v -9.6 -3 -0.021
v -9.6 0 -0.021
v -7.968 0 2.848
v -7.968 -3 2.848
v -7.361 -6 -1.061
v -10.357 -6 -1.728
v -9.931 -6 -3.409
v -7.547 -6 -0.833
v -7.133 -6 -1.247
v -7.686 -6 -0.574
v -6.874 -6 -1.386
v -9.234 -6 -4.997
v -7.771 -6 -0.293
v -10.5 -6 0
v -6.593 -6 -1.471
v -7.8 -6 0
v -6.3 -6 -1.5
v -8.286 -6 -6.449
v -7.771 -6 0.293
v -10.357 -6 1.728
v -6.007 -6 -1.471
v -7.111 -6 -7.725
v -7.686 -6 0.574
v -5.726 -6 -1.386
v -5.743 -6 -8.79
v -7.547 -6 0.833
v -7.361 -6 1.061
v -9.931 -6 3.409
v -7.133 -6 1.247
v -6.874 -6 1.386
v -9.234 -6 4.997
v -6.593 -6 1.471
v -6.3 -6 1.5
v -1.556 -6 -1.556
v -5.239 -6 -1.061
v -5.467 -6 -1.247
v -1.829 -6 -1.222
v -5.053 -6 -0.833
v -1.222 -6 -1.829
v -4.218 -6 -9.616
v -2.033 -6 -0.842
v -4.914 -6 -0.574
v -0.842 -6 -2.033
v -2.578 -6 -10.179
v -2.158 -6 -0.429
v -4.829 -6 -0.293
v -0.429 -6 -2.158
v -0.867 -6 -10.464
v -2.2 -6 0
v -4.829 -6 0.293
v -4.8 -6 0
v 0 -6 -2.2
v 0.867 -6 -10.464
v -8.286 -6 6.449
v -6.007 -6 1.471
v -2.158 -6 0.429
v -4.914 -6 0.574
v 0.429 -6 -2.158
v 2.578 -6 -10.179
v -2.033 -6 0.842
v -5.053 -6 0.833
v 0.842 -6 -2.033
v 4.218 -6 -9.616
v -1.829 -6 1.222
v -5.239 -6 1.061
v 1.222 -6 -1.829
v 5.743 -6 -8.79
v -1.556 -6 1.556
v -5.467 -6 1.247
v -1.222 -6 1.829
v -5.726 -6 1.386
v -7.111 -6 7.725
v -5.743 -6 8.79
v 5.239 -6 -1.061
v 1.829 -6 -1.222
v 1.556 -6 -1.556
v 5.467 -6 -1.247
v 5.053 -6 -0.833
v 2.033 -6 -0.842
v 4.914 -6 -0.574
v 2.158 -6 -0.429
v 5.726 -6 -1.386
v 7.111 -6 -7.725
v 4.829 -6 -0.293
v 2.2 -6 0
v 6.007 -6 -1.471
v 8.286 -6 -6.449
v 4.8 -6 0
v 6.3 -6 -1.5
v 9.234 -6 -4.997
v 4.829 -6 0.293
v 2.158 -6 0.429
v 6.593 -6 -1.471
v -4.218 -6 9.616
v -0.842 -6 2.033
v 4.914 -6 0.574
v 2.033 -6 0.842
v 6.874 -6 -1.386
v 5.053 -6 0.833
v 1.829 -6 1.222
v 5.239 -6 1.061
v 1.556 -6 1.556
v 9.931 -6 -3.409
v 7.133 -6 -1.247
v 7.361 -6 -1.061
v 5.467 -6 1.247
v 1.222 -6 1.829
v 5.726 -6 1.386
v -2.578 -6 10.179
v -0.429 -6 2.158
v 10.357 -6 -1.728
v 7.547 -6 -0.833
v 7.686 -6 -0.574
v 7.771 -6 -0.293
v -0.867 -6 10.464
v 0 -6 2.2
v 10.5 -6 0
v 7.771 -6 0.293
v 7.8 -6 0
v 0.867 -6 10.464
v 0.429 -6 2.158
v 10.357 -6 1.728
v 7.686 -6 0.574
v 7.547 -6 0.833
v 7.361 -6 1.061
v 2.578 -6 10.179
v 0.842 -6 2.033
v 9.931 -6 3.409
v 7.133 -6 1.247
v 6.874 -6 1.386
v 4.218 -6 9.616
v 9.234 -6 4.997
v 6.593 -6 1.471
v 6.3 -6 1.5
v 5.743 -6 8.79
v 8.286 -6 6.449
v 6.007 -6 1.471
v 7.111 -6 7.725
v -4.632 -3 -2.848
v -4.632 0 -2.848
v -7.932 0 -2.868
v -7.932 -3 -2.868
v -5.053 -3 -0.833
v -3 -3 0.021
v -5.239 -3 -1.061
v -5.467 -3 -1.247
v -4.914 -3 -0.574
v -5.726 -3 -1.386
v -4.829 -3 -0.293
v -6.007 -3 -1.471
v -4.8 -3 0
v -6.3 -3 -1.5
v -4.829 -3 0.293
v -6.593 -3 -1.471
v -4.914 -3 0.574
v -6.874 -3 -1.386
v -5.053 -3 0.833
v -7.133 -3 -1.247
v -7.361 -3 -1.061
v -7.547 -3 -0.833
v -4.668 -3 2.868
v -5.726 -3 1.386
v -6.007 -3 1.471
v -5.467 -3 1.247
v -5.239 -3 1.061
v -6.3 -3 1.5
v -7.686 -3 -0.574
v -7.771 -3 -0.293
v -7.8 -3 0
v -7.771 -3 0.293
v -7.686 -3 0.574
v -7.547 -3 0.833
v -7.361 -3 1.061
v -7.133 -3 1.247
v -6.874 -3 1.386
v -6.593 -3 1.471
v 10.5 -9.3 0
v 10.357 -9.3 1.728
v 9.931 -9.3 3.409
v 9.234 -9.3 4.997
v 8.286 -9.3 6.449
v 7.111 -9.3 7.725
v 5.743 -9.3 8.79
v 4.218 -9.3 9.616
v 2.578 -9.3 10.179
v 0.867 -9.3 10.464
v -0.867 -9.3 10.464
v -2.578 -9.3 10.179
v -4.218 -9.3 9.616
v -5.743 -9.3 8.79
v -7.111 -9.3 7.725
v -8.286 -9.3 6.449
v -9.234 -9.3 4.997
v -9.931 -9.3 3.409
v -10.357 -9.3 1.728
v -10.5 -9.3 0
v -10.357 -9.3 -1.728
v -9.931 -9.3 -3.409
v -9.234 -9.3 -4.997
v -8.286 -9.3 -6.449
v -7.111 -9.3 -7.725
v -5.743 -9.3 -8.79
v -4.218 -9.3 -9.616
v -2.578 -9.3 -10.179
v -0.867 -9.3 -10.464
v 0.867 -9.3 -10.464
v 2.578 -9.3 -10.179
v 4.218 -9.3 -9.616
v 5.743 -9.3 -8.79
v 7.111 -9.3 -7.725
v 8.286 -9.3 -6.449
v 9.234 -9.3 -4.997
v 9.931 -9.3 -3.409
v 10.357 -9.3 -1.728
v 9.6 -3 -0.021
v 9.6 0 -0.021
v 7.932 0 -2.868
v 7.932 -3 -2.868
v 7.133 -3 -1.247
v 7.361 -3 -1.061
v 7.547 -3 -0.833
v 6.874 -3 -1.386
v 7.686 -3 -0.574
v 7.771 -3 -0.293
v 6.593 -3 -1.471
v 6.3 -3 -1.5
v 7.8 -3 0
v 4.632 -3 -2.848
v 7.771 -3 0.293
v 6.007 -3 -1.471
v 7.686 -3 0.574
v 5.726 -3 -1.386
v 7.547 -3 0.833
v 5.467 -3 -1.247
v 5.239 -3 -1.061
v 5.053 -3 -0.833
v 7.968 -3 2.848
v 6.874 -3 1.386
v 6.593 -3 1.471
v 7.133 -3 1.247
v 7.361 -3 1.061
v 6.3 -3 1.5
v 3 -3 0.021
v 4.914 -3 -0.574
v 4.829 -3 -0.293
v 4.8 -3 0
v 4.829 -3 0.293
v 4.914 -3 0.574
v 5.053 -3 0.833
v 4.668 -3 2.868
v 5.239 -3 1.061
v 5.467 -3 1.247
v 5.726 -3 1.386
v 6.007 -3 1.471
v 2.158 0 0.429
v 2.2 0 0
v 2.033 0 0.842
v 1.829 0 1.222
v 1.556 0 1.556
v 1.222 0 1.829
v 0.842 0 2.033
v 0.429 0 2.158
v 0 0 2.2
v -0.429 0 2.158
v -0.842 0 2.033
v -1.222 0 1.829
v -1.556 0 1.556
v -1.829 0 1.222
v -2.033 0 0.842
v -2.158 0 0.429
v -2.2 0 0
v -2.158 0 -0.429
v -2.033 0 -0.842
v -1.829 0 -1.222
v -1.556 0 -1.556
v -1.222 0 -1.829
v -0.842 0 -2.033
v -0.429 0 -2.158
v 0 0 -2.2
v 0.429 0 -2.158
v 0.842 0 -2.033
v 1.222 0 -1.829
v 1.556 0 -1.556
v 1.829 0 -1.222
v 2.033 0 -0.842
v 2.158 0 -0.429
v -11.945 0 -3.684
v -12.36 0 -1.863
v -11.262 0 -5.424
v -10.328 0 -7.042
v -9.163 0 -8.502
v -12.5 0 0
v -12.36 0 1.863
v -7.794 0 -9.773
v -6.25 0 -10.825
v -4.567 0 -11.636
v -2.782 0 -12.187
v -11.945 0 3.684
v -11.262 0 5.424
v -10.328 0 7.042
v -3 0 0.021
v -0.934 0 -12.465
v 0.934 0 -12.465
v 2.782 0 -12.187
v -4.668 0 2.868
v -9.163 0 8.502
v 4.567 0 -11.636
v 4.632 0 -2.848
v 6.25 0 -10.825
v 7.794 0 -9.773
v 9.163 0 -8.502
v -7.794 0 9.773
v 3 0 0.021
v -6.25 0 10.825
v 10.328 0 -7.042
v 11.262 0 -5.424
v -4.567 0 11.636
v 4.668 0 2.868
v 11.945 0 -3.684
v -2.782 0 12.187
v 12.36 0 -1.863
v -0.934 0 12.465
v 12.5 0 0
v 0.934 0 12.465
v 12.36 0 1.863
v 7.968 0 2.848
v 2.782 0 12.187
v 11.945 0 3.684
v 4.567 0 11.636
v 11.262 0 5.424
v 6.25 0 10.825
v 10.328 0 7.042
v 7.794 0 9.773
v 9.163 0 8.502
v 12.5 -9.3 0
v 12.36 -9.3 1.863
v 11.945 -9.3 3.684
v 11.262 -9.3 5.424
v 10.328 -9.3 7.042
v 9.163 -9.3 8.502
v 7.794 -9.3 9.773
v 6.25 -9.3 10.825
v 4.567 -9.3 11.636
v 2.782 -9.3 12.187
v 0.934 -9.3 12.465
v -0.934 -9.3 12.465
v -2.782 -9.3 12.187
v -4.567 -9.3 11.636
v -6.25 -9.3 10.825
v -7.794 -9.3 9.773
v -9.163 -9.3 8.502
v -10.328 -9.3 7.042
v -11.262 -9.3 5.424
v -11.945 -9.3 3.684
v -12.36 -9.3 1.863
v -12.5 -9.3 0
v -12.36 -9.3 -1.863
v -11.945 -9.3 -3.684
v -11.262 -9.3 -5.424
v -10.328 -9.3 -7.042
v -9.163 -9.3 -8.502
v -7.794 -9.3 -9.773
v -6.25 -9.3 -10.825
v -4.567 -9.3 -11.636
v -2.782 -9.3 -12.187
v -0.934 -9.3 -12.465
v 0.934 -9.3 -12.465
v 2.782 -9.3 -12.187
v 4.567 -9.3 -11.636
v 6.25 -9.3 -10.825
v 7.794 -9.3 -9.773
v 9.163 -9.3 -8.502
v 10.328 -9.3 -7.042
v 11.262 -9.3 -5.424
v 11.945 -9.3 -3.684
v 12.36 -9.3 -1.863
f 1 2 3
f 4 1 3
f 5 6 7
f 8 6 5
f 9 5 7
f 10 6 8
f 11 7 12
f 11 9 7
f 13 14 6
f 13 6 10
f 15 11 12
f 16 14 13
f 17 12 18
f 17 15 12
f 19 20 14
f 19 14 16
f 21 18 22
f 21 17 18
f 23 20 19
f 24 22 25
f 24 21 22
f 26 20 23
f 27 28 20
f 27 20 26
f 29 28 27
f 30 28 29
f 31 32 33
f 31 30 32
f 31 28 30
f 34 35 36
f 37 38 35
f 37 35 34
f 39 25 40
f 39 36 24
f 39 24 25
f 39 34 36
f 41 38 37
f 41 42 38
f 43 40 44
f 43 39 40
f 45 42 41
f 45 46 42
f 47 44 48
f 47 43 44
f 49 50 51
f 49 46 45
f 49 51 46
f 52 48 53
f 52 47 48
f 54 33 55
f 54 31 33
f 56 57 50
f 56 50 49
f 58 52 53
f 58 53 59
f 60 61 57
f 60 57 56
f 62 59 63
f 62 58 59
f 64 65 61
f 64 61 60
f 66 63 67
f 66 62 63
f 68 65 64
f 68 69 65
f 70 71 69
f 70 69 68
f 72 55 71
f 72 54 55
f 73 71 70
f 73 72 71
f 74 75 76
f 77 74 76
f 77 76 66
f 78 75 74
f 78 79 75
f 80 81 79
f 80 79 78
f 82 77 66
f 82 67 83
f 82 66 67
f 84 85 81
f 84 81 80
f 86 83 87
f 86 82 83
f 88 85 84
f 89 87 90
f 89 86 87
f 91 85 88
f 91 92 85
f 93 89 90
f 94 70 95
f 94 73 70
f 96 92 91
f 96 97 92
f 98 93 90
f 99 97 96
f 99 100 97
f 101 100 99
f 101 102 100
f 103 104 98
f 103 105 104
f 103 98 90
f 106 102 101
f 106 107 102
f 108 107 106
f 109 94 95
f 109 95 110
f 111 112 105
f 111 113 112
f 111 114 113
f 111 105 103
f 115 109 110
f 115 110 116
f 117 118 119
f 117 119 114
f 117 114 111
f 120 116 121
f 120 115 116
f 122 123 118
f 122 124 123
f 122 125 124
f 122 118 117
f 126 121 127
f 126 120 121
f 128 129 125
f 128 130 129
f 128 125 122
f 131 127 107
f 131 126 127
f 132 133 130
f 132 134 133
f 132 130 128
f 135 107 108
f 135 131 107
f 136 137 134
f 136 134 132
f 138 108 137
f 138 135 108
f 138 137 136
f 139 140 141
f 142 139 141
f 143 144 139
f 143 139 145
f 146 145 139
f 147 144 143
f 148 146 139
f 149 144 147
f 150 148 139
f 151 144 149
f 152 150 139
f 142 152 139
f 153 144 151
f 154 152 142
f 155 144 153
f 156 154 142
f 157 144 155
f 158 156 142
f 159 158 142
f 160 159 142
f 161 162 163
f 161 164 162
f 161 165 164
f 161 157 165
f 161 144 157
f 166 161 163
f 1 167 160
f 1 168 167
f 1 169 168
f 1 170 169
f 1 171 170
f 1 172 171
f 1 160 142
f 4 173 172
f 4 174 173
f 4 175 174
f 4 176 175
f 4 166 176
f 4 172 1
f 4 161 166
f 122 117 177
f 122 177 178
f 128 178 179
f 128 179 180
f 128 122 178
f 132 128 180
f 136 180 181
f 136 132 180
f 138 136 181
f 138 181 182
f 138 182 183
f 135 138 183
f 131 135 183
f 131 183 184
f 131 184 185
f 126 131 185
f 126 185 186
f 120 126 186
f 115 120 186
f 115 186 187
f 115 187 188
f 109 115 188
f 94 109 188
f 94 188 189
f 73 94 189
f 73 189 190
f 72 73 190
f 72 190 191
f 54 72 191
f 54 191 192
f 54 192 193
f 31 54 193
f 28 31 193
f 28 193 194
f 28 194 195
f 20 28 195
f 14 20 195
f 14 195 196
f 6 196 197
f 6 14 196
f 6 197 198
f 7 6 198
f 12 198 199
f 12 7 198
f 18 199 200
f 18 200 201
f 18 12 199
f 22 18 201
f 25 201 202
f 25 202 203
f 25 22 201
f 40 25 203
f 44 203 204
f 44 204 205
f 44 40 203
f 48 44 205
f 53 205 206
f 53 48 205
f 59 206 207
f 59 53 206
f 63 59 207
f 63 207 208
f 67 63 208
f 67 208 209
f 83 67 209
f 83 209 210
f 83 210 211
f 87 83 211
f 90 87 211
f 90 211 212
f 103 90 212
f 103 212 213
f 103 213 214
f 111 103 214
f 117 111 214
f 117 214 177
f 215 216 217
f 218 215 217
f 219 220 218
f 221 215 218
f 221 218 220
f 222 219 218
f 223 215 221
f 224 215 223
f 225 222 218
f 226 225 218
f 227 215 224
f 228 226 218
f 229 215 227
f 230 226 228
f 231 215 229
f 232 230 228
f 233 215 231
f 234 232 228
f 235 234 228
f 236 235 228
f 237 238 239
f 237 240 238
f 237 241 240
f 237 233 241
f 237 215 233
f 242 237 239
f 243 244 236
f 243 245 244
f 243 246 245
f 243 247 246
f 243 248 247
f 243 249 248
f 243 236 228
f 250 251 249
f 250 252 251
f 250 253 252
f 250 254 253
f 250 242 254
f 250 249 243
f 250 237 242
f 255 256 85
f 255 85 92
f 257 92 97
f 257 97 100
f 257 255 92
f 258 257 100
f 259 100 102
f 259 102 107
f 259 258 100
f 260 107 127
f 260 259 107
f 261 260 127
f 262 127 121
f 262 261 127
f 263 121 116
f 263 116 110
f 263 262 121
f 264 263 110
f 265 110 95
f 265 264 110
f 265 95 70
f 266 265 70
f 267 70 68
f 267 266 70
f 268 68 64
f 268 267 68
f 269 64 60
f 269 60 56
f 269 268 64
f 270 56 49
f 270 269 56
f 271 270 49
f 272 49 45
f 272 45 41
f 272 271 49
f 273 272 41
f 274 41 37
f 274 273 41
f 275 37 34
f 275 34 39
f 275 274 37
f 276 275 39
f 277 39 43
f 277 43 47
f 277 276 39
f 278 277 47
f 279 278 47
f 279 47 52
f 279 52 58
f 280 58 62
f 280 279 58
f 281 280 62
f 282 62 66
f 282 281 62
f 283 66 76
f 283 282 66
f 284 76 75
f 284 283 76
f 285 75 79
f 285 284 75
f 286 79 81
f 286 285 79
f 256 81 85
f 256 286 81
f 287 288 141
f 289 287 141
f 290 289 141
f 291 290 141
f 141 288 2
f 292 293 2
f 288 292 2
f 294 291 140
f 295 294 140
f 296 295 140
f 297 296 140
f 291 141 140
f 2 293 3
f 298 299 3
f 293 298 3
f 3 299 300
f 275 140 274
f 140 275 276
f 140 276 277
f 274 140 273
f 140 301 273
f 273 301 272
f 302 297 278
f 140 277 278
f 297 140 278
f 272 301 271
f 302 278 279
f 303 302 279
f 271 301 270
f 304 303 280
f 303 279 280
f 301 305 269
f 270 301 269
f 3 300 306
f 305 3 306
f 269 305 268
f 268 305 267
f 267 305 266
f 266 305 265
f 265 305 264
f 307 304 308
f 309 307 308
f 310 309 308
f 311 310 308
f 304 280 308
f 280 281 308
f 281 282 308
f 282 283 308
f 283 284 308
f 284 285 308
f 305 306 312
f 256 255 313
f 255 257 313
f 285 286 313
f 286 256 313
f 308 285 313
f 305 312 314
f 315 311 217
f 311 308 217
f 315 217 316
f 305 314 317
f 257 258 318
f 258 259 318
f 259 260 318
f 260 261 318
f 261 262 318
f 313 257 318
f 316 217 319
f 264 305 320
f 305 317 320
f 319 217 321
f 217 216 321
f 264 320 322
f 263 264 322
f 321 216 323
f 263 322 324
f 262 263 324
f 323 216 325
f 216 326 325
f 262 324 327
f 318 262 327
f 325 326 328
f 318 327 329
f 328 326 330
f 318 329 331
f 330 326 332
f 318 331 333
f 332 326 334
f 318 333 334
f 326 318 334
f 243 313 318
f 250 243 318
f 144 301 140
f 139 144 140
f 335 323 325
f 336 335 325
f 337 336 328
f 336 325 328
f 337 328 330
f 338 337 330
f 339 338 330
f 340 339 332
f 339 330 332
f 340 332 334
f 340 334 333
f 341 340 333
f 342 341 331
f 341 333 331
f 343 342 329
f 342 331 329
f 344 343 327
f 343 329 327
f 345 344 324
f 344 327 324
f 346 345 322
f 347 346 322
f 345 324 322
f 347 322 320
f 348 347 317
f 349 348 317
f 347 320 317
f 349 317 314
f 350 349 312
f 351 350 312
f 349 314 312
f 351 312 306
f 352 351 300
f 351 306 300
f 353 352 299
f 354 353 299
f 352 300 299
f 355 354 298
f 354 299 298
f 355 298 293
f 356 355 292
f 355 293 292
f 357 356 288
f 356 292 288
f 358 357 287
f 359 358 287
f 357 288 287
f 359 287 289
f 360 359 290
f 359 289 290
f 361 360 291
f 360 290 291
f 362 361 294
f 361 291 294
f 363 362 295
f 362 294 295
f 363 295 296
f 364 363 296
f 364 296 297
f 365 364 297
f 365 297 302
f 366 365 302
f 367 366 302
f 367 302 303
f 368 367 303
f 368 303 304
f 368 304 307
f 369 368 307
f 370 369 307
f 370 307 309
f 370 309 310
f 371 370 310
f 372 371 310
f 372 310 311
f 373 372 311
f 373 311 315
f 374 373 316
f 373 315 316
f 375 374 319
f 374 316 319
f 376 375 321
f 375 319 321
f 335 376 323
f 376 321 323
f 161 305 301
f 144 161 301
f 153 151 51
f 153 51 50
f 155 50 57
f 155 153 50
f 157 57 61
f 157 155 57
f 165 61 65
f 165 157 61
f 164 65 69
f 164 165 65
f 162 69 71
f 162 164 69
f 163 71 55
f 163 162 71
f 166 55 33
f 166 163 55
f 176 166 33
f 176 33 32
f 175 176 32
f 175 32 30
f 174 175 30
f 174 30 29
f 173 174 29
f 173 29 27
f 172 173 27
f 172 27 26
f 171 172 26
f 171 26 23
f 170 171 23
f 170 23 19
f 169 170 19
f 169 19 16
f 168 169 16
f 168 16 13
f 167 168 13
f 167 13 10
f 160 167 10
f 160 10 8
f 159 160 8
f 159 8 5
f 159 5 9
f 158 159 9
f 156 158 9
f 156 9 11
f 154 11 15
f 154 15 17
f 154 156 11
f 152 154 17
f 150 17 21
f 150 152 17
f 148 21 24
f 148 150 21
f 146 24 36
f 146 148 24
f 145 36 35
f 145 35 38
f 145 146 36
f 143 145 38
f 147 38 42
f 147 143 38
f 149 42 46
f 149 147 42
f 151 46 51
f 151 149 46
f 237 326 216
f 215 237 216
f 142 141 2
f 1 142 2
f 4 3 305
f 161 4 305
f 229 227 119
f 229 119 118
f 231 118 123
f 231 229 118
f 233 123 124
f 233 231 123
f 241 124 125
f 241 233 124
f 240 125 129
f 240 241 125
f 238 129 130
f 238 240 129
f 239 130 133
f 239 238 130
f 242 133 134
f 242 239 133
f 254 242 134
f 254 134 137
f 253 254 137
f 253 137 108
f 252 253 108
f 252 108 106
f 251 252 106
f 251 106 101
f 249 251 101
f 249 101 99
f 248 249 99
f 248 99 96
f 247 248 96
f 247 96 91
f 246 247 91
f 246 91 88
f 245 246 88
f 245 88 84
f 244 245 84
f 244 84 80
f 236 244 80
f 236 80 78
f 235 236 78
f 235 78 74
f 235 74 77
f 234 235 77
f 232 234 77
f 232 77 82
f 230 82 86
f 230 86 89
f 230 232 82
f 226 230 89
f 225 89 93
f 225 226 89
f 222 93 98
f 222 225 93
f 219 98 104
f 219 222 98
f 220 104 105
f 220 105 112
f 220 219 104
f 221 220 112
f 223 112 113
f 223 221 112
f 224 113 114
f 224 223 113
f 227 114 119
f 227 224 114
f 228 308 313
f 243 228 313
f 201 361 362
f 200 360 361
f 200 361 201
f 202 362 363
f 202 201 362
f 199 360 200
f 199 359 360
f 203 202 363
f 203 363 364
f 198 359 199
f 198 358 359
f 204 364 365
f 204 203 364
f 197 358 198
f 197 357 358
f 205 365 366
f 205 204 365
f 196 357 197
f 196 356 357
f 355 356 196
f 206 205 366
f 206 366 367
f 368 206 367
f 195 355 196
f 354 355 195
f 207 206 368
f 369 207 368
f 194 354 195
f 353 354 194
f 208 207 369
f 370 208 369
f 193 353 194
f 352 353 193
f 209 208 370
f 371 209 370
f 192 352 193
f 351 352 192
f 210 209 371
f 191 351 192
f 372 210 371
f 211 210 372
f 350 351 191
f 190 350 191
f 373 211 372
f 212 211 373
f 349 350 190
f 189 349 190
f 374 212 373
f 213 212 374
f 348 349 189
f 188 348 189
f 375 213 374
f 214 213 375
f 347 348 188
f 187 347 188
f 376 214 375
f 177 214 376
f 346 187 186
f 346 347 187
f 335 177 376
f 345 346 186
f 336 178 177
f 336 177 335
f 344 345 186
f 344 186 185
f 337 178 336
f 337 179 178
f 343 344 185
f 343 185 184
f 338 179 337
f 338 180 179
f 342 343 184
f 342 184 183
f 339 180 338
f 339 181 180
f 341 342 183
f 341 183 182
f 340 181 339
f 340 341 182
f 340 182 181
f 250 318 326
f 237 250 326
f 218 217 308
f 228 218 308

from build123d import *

# Parameters (mm, degrees)
F0_R     = 12.5
F0_R_2   = 10.5
F1_DEPTH = 9.3
F0_R_3   = 1.5
F0_R_4   = 2.2
F2_DEPTH = 6
F3_R     = 1.5
F4_DEPTH = 3


with BuildPart() as f1:
    # F0 (on Front) → F1 (new body)
    with BuildSketch(Plane.XZ):
        Circle(F0_R)
        Circle(F0_R_2, mode=Mode.SUBTRACT)
    extrude(amount=F1_DEPTH)

    # F0 (on Front) → F2 (join)
    with BuildSketch(Plane.XZ):
        Circle(F0_R_2)
        with Locations((-6.3, 0)):
            Circle(F0_R_3, mode=Mode.SUBTRACT)
        Circle(F0_R_4, mode=Mode.SUBTRACT)
        with Locations((6.3, 0)):
            Circle(F0_R_3, mode=Mode.SUBTRACT)
    extrude(amount=F2_DEPTH)

    # F3 (on face) → F4 (cut)
    with BuildSketch(Plane(origin=(0, 0, 0), x_dir=(-1, 0, 0), z_dir=(0, 1, 0))):
        Polygon((-4.63207, -2.847532), (-3, 0.020704), (-4.66793, 2.868236), (-7.96793, 2.847532), (-9.6, -0.020704), (-7.93207, -2.868236), align=None)
        with Locations((-6.3, 0)):
            Circle(F3_R, mode=Mode.SUBTRACT)
        Polygon((7.93207, -2.868236), (9.6, -0.020704), (7.96793, 2.847532), (4.66793, 2.868236), (3, 0.020704), (4.63207, -2.847532), align=None)
        with Locations((6.3, 0)):
            Circle(F3_R, mode=Mode.SUBTRACT)
    extrude(amount=-F4_DEPTH, mode=Mode.SUBTRACT)


solid = f1.part
